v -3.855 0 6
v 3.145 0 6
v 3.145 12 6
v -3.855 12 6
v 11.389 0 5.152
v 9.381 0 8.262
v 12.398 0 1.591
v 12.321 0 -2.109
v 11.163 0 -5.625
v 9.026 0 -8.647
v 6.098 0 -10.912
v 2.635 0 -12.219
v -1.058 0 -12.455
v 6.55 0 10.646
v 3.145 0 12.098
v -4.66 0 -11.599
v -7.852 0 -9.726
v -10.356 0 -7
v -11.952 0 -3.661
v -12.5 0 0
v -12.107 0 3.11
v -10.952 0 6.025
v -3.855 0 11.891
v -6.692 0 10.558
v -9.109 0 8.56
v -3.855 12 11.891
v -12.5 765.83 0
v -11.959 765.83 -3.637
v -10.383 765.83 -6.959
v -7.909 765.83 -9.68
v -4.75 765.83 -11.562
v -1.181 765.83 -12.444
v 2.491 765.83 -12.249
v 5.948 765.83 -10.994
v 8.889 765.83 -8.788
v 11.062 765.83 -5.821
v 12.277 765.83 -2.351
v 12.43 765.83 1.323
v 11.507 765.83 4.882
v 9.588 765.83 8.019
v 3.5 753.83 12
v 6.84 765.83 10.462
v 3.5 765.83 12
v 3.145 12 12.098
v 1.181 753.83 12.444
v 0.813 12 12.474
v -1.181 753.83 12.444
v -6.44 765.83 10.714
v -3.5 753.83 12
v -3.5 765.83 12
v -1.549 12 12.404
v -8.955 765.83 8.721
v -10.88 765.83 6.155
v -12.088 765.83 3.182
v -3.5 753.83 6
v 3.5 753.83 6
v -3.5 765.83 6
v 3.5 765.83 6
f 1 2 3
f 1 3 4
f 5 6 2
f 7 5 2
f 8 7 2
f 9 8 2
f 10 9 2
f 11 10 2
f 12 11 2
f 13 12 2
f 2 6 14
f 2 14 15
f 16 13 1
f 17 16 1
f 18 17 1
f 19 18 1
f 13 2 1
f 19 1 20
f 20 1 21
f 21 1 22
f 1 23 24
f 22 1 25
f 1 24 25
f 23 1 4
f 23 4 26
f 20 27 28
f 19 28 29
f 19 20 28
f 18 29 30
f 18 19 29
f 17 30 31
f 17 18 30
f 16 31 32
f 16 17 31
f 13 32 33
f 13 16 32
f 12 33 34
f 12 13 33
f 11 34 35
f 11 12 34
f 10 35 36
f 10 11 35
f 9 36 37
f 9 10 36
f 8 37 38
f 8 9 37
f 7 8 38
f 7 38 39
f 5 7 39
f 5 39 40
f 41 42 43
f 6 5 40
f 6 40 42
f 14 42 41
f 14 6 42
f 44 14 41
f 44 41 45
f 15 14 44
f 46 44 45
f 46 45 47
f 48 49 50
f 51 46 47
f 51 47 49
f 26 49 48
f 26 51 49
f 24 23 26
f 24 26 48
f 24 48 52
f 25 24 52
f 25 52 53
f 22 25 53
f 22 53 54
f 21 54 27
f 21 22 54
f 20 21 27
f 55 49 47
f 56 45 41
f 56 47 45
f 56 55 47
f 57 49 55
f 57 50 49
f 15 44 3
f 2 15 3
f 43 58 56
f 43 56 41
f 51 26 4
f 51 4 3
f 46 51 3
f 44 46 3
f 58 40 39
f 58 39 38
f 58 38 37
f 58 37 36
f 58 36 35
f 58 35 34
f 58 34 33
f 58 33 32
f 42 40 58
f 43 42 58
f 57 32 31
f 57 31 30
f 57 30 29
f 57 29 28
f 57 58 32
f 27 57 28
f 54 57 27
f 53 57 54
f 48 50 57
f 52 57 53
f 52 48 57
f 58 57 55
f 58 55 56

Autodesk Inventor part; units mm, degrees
ref_plane "XZ Plane" through (0, 0, 0) normal (0, 1, 0) x (-1, 0, 0)
sketch "Skizze1" plane through (0, 0, 0) normal (0, 1, 0) x (-1, 0, 0)
  circle A0 centre (0, 0) radius 12.5
  dimension "d0" = 25
extrude "Extrusion1" add sketch "Skizze1" along normal blind 765.83
ref_plane "Arbeitsebene1" through (-7.5, 0, 0) normal (1, 0, 0) x (0, 1, 0)
ref_plane "Arbeitsebene2" through (7.5, 0, 0) normal (1, 0, 0) x (0, 1, 0)
sketch "Skizze4" plane through (0, 765.83, 0) normal (0, 1, 0) x (1, 0, 0)
  line L0 (3.5, -16) -> (-3.5, -16)
  line L1 (-3.5, -16) -> (-3.5, -6)
  line L2 (-3.5, -6) -> (3.5, -6)
  line L3 (3.5, -6) -> (3.5, -16)
  line L4 (0, 18.2) -> (0, -21.7) construction
  line L5 (-17.5, 0) -> (17.5, 0) construction
  dimension "d15" = 6
  dimension "d16" = 10
  dimension "d17" = 7
extrude "Extrusion4" cut sketch "Skizze4" against normal blind 12
sketch "Skizze5" plane through (0, 0, 0) normal (0, -1, 0) x (1, 0, 0)
  line L0 (-3.8549, 16) -> (3.1451, 16)
  line L1 (3.1451, 16) -> (3.1451, 6)
  line L2 (3.1451, 6) -> (-3.8549, 6)
  line L3 (-3.8549, 6) -> (-3.8549, 16)
  line L4 (-17.5, 0) -> (17.5, 0) construction
  dimension "d20" = 6
  dimension "d21" = 10
  dimension "d22" = 7
extrude "Extrusion5" cut sketch "Skizze5" against normal blind 12
equation "\"Wellensdurchmesser\" = 35"
equation "\"Wellenlänge\" = 724.33"
properties part number "Welle"
